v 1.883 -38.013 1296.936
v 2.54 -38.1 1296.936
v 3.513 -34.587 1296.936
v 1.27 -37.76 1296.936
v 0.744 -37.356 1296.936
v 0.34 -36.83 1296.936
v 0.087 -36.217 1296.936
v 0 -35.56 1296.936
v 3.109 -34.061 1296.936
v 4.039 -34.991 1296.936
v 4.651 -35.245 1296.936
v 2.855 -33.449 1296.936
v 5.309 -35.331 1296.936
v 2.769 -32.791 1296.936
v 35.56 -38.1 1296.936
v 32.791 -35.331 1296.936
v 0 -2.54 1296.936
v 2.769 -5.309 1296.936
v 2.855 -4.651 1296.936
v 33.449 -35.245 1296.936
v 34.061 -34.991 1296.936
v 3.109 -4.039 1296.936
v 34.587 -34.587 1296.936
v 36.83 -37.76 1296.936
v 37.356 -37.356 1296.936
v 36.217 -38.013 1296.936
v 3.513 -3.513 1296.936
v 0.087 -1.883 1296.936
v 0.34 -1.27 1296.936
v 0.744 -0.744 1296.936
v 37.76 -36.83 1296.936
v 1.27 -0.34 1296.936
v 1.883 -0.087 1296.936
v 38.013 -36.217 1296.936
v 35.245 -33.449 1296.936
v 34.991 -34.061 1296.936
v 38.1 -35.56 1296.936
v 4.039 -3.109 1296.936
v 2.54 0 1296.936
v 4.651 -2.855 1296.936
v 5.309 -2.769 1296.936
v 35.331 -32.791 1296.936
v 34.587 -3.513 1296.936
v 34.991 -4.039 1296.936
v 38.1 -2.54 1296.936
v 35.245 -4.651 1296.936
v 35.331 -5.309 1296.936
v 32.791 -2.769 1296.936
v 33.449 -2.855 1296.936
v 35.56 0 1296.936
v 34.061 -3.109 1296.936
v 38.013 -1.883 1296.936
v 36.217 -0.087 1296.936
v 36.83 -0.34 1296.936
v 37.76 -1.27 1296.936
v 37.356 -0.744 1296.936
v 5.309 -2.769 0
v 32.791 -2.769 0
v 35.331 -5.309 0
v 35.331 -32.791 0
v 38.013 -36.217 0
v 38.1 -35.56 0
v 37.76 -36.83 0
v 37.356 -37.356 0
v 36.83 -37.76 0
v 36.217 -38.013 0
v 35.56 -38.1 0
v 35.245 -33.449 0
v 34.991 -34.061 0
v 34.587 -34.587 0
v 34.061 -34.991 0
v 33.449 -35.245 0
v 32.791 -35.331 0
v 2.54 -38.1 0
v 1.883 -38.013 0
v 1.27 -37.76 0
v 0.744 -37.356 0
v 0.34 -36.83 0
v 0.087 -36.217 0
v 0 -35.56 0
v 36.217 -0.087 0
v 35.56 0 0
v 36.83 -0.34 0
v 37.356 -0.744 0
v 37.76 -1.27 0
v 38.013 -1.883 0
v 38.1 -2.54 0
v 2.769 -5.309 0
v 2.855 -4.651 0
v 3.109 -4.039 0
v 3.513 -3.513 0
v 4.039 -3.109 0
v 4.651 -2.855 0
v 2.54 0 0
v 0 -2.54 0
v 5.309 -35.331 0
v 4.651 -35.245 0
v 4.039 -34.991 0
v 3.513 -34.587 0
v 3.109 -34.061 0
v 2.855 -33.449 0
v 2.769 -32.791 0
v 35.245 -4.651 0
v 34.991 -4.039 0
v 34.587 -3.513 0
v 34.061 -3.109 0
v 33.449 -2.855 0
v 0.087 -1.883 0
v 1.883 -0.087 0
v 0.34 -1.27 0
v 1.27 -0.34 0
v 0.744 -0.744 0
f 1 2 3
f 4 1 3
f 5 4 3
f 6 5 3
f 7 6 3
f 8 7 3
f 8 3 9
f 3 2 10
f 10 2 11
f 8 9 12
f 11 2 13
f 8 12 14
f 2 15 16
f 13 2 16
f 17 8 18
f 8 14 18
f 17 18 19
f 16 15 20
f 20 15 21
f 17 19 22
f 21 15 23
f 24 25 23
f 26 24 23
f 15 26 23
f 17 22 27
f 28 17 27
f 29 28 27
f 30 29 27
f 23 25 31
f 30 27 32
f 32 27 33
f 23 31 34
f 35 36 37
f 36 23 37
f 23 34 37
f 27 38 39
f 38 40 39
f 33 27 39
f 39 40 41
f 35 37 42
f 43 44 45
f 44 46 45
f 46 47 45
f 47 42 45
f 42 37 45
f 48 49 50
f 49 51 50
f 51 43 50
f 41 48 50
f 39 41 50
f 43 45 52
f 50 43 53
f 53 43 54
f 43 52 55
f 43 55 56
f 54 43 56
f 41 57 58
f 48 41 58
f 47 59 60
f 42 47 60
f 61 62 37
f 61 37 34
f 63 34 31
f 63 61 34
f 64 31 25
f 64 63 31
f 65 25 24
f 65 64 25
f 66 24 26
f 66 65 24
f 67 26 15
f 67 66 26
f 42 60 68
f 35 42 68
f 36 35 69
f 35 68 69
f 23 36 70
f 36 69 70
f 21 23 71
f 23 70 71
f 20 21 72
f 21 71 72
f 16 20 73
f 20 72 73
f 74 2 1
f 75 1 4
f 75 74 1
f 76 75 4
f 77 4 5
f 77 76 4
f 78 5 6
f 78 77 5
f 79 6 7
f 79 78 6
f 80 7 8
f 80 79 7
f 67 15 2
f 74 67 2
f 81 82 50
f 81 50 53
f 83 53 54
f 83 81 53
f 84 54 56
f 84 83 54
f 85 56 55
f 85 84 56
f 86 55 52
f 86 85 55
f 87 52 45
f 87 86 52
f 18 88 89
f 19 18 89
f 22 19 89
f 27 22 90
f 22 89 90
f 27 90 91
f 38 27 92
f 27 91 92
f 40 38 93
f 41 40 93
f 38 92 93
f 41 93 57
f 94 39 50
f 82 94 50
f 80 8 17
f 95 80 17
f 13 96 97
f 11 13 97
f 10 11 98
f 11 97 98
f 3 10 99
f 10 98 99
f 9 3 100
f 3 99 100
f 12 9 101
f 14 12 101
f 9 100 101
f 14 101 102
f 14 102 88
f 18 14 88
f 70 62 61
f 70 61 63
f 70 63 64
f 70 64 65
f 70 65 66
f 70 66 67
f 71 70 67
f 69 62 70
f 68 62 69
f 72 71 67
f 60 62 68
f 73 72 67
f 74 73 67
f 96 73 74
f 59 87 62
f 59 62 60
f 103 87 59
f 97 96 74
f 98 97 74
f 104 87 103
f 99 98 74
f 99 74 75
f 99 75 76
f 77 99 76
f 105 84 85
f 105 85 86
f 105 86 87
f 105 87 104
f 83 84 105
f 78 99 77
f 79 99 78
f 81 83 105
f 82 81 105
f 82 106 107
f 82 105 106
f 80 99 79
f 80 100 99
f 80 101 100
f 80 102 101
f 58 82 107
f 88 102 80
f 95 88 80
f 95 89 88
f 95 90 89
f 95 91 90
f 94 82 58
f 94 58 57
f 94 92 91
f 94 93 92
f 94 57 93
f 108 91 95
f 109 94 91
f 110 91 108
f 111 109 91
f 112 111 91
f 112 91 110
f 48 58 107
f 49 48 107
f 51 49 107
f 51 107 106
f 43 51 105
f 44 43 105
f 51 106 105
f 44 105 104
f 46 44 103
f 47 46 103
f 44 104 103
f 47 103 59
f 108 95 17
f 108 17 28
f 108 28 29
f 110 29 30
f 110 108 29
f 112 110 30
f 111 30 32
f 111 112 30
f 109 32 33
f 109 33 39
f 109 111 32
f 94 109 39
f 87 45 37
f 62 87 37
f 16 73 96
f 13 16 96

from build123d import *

# Parameters (mm, degrees)
BOSS_EXTRUDE1_DEPTH     = 1500
CUT_EXTRUDE3_DEPTH      = 1501.967428028
CUT_EXTRUDE3_DEPTH_BACK = 1501.967428028
SKETCH2_W               = 432.224270186
SKETCH2_H               = 1076.950896283
SKETCH2_W_2             = 908.538956416
SKETCH2_H_2             = 1717.469993805


with BuildPart() as part:
    # Sketch1 → Boss-Extrude1 (new body)
    with BuildSketch(Plane.XY):
        with BuildLine():
            Line((2.54, 0), (35.56, 0))
            ThreePointArc((35.56, 0), (37.356051224, -0.743948776), (38.1, -2.54))
            Line((38.1, -2.54), (38.1, -35.56))
            ThreePointArc((38.1, -35.56), (37.356051224, -37.356051224), (35.56, -38.1))
            Line((35.56, -38.1), (2.54, -38.1))
            ThreePointArc((2.54, -38.1), (0.743948776, -37.356051224), (0, -35.56))
            Line((0, -35.56), (0, -2.54))
            ThreePointArc((0, -2.54), (0.743948776, -0.743948776), (2.54, 0))
        make_face()
        with BuildLine():
            Line((5.3086, -2.7686), (32.7914, -2.7686))
            ThreePointArc((32.7914, -2.7686), (34.587451224, -3.512548776), (35.3314, -5.3086))
            Line((35.3314, -5.3086), (35.3314, -32.7914))
            ThreePointArc((35.3314, -32.7914), (34.587451224, -34.587451224), (32.7914, -35.3314))
            Line((32.7914, -35.3314), (5.3086, -35.3314))
            ThreePointArc((5.3086, -35.3314), (3.512548776, -34.587451224), (2.7686, -32.7914))
            Line((2.7686, -32.7914), (2.7686, -5.3086))
            ThreePointArc((2.7686, -5.3086), (3.512548776, -3.512548776), (5.3086, -2.7686))
        make_face(mode=Mode.SUBTRACT)
    extrude(amount=BOSS_EXTRUDE1_DEPTH)

    # Sketch2 → Cut-Extrude3 (cut, two sides: drawn at the far end of the back side and taken through both)
    with BuildSketch(Plane.ZY.offset(-CUT_EXTRUDE3_DEPTH_BACK)):
        with Locations((-216.112135093, 500.375448142)):
            Rectangle(SKETCH2_W, SKETCH2_H)
        with Locations((1751.205155953, -66.993484906)):
            Rectangle(SKETCH2_W_2, SKETCH2_H_2)
    extrude(amount=CUT_EXTRUDE3_DEPTH + CUT_EXTRUDE3_DEPTH_BACK, mode=Mode.SUBTRACT)


solid = part.part
